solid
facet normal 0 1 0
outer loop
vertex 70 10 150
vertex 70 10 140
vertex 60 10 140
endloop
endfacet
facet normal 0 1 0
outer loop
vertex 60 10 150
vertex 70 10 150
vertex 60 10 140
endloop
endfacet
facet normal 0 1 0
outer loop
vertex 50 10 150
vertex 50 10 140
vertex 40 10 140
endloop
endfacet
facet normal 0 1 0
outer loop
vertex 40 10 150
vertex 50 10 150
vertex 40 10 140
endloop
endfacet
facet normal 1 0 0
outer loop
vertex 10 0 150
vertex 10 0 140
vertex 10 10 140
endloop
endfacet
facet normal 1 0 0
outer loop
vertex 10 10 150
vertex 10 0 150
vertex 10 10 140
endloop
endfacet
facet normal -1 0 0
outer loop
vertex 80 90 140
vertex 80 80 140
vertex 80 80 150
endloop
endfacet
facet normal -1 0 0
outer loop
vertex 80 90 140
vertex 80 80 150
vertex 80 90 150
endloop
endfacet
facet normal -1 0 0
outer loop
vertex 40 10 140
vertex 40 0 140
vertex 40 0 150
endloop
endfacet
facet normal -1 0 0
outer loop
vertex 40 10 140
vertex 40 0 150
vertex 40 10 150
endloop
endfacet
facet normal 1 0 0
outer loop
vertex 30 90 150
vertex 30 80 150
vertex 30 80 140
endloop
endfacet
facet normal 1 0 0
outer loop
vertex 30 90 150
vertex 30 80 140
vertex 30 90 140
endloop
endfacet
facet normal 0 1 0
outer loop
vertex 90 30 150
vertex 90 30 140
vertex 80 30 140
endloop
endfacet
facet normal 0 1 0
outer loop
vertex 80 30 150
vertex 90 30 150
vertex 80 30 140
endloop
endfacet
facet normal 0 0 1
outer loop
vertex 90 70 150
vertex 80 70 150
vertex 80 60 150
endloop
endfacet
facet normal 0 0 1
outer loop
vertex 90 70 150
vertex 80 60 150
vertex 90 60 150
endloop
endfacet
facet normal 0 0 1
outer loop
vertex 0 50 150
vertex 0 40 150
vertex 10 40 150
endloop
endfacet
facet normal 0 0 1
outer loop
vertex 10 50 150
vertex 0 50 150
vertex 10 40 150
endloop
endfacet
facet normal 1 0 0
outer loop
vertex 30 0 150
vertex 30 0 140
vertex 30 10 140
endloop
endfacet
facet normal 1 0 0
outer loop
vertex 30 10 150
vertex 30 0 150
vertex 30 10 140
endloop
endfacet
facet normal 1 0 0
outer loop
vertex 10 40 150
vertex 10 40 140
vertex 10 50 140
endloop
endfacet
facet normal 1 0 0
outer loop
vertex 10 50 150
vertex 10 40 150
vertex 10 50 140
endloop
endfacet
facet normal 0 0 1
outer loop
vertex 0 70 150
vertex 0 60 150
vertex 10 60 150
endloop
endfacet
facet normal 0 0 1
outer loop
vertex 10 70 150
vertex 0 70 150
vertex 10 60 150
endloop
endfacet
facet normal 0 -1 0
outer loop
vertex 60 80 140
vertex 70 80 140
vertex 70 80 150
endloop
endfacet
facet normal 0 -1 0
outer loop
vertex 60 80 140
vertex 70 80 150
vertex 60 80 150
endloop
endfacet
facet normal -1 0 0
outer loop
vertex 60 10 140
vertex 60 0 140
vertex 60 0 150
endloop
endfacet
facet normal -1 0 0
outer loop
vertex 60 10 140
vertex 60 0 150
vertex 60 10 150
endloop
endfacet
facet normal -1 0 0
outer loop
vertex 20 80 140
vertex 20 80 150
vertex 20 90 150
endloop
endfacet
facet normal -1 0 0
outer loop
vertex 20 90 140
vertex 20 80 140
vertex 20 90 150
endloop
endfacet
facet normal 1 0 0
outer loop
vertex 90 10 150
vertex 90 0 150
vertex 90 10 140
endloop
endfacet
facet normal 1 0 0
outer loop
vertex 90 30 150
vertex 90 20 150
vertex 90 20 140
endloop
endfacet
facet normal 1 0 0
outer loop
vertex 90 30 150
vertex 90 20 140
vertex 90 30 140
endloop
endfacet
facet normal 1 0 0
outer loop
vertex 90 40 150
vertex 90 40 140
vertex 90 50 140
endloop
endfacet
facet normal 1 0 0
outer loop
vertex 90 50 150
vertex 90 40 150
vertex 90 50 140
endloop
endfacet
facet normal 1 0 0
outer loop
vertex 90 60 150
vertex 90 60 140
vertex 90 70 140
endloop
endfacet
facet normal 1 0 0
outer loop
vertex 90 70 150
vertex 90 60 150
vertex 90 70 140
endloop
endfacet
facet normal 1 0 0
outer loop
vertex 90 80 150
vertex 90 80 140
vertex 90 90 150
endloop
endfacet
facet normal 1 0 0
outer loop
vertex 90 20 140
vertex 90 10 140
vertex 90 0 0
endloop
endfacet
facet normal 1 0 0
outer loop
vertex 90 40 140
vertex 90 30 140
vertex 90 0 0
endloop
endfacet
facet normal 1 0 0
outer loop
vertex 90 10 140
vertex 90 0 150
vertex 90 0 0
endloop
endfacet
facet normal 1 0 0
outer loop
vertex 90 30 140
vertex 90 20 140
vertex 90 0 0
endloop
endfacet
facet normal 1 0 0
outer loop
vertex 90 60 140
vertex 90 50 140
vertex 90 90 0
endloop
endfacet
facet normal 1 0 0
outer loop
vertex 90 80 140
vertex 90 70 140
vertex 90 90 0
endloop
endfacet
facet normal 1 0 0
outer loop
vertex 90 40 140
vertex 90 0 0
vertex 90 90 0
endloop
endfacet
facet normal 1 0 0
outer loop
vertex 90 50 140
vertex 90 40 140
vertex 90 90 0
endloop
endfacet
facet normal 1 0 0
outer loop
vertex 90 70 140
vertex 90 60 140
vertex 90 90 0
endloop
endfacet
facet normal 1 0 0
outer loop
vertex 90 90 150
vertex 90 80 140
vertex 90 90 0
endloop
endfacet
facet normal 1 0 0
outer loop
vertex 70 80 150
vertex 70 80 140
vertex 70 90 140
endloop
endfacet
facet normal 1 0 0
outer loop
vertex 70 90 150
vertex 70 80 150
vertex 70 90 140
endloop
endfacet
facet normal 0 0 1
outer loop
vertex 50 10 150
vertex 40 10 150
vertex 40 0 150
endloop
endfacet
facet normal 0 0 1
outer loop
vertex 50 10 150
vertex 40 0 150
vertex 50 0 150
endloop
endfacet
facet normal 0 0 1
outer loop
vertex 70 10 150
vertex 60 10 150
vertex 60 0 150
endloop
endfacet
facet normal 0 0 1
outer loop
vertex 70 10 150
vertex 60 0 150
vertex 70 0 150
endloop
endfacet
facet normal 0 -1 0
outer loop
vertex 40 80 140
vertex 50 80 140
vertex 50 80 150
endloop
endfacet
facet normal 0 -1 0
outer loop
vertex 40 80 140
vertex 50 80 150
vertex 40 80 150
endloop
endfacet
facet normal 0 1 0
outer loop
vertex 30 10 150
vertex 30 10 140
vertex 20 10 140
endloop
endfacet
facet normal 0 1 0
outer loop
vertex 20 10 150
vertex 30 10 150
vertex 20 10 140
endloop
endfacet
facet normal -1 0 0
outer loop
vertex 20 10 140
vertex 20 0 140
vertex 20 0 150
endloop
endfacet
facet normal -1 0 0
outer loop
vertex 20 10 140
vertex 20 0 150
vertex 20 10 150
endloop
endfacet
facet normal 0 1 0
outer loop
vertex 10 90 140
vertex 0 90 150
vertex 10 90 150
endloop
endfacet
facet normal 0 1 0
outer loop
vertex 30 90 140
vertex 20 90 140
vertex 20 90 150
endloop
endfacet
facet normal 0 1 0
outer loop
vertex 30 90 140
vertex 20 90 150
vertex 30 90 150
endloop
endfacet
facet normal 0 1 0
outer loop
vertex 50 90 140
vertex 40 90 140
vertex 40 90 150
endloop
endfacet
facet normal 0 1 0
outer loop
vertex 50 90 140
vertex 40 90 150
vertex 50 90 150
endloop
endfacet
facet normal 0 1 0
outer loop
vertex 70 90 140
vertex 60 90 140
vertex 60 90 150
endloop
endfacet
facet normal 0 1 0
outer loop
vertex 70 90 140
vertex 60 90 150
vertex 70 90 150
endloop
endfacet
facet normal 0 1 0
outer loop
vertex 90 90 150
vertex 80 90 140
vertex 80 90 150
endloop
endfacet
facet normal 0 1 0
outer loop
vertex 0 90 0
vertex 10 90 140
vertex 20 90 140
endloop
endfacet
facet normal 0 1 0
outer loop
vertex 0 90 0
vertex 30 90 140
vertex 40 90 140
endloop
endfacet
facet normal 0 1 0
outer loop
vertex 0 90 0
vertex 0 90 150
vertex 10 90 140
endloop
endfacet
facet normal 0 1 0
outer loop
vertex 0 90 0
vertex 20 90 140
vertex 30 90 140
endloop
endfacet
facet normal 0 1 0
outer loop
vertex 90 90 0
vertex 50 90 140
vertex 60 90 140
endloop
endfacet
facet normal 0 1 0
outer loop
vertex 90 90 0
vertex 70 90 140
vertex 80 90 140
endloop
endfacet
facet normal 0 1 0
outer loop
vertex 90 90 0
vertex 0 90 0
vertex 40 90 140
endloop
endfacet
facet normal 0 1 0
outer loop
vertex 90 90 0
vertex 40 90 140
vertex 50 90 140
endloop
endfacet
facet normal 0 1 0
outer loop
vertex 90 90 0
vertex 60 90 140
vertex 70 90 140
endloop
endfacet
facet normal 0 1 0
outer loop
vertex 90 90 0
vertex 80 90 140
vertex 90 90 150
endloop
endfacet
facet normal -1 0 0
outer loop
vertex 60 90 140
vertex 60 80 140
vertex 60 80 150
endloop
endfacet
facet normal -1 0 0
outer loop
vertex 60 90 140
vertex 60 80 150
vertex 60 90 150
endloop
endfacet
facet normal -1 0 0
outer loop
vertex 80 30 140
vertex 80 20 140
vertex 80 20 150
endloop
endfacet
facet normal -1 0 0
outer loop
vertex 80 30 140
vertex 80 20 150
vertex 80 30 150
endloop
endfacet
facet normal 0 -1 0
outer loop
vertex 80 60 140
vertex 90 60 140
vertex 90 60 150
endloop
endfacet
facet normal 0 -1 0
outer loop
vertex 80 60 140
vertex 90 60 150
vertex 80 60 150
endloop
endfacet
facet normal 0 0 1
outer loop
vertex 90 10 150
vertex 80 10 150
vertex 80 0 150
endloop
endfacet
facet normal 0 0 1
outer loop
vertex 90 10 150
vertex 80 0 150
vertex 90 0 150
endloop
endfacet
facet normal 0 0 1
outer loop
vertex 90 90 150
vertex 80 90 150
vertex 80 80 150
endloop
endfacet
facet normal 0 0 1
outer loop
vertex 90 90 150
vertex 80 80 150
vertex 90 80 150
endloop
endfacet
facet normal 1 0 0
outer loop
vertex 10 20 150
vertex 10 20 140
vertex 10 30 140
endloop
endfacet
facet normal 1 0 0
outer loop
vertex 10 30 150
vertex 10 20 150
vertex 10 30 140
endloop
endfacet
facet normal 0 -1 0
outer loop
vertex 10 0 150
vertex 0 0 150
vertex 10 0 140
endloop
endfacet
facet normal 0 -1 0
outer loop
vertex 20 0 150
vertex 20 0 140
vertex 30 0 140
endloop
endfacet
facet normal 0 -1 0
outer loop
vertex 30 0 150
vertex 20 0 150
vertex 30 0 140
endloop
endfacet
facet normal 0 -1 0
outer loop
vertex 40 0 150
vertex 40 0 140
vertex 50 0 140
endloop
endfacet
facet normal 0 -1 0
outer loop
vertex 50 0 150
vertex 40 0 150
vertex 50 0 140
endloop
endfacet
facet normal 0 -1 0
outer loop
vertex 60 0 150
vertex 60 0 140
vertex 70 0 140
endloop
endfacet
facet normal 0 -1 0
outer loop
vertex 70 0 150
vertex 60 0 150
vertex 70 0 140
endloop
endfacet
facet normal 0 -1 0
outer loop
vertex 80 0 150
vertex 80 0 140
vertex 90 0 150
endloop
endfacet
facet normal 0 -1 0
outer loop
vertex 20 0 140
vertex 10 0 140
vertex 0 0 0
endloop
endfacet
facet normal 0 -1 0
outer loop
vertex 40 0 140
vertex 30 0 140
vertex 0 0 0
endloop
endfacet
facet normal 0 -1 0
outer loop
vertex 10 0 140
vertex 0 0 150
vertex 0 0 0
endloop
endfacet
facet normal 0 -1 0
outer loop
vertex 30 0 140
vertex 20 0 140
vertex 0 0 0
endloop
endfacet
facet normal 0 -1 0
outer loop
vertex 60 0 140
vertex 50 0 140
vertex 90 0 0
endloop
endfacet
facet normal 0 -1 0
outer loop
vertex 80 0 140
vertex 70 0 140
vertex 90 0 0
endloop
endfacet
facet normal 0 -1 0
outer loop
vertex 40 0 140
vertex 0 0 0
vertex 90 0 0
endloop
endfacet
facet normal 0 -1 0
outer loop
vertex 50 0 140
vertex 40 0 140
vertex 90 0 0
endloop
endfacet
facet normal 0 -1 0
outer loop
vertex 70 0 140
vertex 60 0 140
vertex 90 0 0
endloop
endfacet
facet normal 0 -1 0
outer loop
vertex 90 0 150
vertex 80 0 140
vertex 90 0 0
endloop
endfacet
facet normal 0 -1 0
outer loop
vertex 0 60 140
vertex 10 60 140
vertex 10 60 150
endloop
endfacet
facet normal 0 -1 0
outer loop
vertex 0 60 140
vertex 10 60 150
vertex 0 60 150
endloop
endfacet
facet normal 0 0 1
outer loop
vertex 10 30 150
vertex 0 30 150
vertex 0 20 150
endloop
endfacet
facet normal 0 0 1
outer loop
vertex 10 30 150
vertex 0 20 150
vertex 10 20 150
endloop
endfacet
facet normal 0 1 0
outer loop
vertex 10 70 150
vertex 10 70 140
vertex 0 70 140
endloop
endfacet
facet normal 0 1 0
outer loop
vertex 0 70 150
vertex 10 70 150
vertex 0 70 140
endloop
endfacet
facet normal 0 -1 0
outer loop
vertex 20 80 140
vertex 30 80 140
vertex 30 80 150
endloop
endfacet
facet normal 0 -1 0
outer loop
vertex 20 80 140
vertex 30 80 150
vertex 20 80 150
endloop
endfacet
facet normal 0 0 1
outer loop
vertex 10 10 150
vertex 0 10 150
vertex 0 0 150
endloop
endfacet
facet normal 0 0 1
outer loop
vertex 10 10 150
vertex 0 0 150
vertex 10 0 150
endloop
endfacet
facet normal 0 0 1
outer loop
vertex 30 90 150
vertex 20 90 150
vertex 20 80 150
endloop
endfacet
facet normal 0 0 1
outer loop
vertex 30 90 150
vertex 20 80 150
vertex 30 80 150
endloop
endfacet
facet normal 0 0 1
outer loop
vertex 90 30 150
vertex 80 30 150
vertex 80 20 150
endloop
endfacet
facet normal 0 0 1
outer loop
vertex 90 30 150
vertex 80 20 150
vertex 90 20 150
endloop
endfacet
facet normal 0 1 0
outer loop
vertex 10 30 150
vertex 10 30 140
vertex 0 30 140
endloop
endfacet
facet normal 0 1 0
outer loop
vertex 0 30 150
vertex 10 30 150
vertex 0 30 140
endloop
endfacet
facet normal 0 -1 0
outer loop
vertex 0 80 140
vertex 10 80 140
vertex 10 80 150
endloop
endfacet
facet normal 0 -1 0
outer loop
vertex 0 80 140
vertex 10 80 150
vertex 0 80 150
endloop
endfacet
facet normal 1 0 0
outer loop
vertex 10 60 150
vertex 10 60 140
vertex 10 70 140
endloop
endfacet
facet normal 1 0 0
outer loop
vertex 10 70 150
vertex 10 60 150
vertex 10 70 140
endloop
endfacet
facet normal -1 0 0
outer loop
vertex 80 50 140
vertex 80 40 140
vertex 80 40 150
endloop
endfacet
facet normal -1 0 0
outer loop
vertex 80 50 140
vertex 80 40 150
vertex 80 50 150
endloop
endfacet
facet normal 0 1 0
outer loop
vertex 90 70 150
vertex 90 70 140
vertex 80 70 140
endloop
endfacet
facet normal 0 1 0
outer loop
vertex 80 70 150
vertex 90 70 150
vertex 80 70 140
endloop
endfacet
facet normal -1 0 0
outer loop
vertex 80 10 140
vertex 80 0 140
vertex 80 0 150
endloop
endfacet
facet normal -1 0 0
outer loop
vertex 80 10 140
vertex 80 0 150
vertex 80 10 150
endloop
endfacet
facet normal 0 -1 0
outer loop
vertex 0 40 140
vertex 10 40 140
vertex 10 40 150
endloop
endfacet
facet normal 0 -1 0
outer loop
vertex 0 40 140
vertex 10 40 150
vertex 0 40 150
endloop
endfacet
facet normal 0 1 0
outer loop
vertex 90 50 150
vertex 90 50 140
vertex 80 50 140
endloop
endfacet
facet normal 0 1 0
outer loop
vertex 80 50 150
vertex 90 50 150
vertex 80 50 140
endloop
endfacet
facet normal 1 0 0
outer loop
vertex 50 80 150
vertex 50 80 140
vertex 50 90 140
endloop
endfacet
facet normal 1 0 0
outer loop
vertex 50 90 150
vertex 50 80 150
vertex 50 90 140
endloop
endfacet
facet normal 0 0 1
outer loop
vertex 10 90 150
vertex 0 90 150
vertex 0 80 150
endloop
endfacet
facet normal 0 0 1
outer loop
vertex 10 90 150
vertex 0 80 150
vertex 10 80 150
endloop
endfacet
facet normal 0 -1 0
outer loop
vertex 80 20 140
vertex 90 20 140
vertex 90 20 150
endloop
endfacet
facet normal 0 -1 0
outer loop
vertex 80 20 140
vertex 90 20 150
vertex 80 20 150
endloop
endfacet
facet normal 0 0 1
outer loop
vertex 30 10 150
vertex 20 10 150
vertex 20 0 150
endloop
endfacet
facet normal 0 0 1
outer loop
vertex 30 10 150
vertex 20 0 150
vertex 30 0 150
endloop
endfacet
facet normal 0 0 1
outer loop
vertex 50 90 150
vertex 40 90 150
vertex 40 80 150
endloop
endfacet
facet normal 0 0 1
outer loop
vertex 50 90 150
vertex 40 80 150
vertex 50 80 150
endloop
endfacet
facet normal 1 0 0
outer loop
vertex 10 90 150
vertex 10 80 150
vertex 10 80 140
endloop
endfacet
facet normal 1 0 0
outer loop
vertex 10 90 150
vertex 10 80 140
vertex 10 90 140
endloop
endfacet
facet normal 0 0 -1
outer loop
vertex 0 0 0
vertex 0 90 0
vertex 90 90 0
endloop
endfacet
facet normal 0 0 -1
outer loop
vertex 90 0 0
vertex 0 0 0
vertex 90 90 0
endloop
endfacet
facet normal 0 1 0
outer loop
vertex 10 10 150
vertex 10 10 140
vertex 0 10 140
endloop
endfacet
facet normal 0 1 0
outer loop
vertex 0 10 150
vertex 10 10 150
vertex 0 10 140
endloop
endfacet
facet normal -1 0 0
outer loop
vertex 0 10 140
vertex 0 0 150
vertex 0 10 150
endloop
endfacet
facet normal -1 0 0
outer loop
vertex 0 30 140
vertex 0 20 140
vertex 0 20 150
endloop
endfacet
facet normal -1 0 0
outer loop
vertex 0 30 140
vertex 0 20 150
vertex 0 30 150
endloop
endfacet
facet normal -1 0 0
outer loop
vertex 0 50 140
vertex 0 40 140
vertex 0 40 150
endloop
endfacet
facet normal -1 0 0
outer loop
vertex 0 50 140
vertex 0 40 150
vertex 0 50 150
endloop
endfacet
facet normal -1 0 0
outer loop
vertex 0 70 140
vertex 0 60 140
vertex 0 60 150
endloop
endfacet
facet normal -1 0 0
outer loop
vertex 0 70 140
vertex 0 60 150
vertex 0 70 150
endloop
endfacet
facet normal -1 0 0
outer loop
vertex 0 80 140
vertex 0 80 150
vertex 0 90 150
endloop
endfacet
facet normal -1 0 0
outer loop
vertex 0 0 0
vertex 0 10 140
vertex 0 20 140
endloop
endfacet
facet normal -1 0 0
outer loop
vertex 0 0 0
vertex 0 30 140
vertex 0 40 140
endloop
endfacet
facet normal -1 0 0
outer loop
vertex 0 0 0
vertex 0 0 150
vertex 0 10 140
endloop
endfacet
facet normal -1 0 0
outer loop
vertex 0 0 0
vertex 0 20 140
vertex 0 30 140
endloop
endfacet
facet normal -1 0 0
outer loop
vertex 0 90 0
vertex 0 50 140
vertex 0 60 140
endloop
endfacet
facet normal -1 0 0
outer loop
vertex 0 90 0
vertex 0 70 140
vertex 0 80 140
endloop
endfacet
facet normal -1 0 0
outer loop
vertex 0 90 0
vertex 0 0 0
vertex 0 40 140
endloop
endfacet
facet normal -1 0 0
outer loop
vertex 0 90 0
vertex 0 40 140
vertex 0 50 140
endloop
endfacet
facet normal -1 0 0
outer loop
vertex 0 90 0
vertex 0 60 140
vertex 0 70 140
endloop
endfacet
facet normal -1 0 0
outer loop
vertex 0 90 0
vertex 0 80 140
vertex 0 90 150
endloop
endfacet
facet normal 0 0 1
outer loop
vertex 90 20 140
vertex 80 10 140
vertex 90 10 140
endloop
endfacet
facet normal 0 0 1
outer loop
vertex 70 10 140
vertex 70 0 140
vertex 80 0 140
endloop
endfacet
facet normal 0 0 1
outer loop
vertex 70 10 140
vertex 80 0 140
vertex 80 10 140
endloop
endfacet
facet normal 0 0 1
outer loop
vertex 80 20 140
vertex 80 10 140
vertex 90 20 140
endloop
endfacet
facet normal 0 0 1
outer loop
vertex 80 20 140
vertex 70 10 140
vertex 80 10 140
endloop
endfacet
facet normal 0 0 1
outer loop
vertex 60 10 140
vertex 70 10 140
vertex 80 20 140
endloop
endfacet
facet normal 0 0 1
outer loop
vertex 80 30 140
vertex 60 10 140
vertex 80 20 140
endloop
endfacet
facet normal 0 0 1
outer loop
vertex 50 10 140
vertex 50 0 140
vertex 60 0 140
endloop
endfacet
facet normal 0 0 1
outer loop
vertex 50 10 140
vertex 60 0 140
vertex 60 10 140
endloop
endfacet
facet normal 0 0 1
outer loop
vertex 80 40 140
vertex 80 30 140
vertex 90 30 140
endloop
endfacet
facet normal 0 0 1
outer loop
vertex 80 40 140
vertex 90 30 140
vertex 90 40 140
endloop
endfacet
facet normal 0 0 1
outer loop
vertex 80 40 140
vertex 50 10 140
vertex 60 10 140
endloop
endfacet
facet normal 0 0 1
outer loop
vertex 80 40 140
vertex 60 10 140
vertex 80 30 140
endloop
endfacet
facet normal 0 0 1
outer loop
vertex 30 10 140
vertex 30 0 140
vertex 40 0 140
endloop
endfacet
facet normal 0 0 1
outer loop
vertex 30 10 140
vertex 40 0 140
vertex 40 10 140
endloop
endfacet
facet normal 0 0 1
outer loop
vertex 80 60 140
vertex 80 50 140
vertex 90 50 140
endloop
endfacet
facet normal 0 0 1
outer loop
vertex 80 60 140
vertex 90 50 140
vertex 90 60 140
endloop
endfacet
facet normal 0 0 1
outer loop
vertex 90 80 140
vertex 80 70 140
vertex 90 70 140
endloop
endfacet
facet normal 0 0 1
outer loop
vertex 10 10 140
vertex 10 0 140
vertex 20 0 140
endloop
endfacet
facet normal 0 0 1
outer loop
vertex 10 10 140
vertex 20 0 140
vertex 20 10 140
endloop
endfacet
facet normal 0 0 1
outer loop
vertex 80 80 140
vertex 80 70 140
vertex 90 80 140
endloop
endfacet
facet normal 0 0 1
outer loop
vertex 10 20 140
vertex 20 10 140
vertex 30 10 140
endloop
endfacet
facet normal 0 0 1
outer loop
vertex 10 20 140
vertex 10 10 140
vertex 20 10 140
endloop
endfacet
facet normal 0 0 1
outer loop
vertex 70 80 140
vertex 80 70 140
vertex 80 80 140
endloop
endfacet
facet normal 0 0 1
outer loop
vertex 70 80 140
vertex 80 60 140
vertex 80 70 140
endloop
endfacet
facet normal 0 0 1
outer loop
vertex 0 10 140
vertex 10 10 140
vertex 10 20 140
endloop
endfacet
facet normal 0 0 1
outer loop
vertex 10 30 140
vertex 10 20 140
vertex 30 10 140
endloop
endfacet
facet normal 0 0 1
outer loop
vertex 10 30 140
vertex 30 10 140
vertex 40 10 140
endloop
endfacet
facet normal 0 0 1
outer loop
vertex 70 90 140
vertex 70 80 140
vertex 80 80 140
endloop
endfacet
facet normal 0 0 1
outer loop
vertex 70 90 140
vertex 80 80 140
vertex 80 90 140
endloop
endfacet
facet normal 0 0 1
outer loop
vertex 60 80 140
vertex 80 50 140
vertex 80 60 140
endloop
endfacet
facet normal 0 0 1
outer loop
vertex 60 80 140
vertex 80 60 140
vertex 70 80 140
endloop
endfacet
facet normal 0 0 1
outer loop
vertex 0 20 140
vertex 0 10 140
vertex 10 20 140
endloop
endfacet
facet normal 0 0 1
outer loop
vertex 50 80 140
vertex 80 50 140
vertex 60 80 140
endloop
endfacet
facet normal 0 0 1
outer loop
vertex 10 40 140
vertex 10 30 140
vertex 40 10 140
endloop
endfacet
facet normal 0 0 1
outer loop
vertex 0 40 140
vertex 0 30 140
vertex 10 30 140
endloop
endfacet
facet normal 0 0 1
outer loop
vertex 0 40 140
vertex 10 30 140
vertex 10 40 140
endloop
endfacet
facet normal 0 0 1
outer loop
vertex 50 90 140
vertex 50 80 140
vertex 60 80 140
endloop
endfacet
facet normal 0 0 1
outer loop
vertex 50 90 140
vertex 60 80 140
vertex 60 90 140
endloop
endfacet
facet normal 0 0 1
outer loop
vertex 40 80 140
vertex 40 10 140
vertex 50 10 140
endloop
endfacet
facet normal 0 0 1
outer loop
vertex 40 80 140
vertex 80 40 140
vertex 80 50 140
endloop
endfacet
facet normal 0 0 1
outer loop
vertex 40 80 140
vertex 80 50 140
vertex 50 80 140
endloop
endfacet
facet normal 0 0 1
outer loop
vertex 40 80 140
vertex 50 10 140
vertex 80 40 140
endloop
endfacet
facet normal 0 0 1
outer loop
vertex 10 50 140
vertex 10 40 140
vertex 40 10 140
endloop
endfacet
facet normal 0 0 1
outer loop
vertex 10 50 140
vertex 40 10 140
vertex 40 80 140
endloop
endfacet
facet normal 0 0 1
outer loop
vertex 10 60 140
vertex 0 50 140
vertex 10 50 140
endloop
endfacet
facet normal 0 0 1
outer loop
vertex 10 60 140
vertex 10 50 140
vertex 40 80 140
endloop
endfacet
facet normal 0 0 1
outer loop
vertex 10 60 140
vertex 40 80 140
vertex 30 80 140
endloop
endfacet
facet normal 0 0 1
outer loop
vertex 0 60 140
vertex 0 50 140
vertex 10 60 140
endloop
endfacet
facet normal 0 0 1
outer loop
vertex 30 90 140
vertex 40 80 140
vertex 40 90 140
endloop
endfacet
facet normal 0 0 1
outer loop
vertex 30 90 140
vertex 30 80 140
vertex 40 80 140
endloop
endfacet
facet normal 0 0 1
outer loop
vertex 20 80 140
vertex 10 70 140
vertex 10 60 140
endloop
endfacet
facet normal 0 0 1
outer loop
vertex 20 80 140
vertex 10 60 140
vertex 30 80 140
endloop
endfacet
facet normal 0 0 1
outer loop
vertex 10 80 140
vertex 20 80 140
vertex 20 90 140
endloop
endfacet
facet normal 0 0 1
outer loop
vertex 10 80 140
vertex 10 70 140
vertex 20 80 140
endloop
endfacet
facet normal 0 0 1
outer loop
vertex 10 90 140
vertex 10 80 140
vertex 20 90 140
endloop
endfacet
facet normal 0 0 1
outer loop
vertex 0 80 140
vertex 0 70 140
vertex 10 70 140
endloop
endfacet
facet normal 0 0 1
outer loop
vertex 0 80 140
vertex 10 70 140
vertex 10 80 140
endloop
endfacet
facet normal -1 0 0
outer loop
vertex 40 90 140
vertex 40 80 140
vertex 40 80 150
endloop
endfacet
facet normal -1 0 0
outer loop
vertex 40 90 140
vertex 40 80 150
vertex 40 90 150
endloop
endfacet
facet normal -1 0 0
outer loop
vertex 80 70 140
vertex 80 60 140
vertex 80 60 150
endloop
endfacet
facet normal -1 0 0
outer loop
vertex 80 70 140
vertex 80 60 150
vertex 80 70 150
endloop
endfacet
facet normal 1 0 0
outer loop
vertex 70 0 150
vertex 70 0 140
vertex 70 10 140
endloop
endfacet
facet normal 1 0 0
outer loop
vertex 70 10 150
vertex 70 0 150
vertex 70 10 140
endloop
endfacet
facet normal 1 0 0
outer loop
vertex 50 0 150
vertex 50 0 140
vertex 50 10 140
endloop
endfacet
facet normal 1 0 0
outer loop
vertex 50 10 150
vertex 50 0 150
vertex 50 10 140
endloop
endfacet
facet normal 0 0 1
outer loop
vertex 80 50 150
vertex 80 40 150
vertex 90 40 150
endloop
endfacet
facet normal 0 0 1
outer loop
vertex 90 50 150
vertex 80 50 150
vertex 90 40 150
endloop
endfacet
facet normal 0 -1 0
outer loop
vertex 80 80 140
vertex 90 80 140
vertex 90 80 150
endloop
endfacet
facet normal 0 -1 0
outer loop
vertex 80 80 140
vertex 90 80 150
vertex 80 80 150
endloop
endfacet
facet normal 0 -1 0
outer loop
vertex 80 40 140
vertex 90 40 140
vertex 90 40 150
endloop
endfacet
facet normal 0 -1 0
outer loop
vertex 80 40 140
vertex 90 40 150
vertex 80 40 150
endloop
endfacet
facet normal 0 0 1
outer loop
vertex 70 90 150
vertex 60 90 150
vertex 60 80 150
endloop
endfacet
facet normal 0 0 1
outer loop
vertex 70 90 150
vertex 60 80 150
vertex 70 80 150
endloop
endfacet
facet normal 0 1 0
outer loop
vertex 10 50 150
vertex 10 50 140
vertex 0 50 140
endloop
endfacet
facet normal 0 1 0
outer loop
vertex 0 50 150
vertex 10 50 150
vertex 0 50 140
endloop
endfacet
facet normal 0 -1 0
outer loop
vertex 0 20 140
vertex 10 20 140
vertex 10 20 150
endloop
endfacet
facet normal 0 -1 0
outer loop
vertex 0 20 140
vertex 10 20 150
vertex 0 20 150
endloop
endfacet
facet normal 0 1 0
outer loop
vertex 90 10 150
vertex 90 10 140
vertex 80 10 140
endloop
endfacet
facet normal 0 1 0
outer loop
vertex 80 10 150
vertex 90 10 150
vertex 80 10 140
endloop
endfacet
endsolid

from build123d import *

# Parameters (mm, degrees)
BOX003_W                 = 50
BOX003_H                 = 50
BOX003_DEPTH             = 10
BOX002_W                 = 10
BOX002_H                 = 110
BOX002_DEPTH             = 10
ARRAY001_X_COUNT         = 4
ARRAY001_X_PITCH         = 20
ARRAY001_PLACEMENT_ANGLE = 90
BOX001_W                 = 10
BOX001_H                 = 110
BOX001_DEPTH             = 10
ARRAY_X_COUNT            = 4
ARRAY_X_PITCH            = 20
BOX_W                    = 90
BOX_H                    = 90
BOX_DEPTH                = 150


with BuildPart() as cube003:
    # Box003 → Box003 (new body)
    with BuildSketch(Plane(origin=(20, 20, 140), x_dir=(1, 0, 0), z_dir=(0, 0, 1))):
        with Locations((25, 25)):
            Rectangle(BOX003_W, BOX003_H)
    extrude(amount=BOX003_DEPTH)


with BuildPart() as array001:
    # Box002 → Box002 (new body)
    with BuildSketch(Plane(origin=(10, -10, 140), x_dir=(1, 0, 0), z_dir=(0, 0, 1))):
        with Locations((5, 55)):
            Rectangle(BOX002_W, BOX002_H)
    extrude(amount=BOX002_DEPTH)

    # Array001 X: Array001 ×4


with BuildPart() as array001_1:
    add(array001.part)
    with Locations(*[(i * ARRAY001_X_PITCH, 0, 0) for i in range(1, ARRAY001_X_COUNT)]):
        add(array001.part)


with BuildPart() as array001_2:
    # Array001 placement: moved
    add(array001_1.part.moved(Location((90, 0, 0))).rotate(Axis((90, 0, 0), (0, 0, 1)), ARRAY001_PLACEMENT_ANGLE))


with BuildPart() as array:
    # Box001 → Box001 (new body)
    with BuildSketch(Plane(origin=(10, -10, 140), x_dir=(1, 0, 0), z_dir=(0, 0, 1))):
        with Locations((5, 55)):
            Rectangle(BOX001_W, BOX001_H)
    extrude(amount=BOX001_DEPTH)

    # Array X: Array ×4


with BuildPart() as array_1:
    add(array.part)
    with Locations(*[(i * ARRAY_X_PITCH, 0, 0) for i in range(1, ARRAY_X_COUNT)]):
        add(array.part)


with BuildPart() as cut002:
    # Box → Box (new body)
    with BuildSketch(Plane.XY):
        with Locations((45, 45)):
            Rectangle(BOX_W, BOX_H)
    extrude(amount=BOX_DEPTH)

    # Cut: cut Array
    add(array_1.part, mode=Mode.SUBTRACT)

    # Cut001: cut Array001
    add(array001_2.part, mode=Mode.SUBTRACT)

    # Cut002: cut Cube003
    add(cube003.part, mode=Mode.SUBTRACT)


solid = cut002.part
